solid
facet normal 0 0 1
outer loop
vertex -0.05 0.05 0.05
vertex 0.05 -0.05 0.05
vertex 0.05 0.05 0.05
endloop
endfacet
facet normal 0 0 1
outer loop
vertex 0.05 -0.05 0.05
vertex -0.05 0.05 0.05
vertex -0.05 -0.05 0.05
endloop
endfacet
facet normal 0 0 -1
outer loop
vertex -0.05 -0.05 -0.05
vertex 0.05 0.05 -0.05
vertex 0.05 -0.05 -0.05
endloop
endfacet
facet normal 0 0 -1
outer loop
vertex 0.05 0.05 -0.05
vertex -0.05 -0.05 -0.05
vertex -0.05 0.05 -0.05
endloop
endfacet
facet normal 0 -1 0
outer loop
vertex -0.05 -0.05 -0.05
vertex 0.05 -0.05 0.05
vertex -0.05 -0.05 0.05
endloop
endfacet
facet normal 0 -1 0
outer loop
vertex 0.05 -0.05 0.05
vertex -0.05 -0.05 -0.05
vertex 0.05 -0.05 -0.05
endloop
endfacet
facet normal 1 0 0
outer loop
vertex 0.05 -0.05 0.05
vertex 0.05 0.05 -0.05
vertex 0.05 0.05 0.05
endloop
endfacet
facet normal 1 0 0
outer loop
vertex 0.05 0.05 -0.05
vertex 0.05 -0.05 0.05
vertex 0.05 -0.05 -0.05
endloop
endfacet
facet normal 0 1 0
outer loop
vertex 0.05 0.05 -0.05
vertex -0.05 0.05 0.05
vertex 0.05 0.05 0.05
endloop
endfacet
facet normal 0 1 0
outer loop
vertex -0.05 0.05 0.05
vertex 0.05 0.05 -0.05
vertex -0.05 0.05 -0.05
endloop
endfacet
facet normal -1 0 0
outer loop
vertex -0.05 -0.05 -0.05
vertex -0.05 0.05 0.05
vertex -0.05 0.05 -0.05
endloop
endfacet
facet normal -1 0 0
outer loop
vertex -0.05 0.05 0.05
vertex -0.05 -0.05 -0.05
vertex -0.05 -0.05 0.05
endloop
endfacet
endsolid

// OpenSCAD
segments=10;
rows=2;

minkowski() {
union() {
for(i=[0:segments]) {
   for(j=[0:rows]) {
      polyhedron(
         points=[
            [
               sin(360/segments*i)*sqrt(rows-j+1),
               cos(360/segments*i)*sqrt(rows-j+1),
               j
            ],
            [
               sin(360/segments*(i+1))*sqrt(rows-j+1),
               cos(360/segments*(i+1))*sqrt(rows-j+1),
               j
            ],
            [
               sin(360/segments*(i+0.5))*sqrt(rows-j),
               cos(360/segments*(i+0.5))*sqrt(rows-j),
               j+1
            ]],triangles=[[0,1,2]]);
   }
}
}
cube([0.1,0.1,0.1],center=true);
}
